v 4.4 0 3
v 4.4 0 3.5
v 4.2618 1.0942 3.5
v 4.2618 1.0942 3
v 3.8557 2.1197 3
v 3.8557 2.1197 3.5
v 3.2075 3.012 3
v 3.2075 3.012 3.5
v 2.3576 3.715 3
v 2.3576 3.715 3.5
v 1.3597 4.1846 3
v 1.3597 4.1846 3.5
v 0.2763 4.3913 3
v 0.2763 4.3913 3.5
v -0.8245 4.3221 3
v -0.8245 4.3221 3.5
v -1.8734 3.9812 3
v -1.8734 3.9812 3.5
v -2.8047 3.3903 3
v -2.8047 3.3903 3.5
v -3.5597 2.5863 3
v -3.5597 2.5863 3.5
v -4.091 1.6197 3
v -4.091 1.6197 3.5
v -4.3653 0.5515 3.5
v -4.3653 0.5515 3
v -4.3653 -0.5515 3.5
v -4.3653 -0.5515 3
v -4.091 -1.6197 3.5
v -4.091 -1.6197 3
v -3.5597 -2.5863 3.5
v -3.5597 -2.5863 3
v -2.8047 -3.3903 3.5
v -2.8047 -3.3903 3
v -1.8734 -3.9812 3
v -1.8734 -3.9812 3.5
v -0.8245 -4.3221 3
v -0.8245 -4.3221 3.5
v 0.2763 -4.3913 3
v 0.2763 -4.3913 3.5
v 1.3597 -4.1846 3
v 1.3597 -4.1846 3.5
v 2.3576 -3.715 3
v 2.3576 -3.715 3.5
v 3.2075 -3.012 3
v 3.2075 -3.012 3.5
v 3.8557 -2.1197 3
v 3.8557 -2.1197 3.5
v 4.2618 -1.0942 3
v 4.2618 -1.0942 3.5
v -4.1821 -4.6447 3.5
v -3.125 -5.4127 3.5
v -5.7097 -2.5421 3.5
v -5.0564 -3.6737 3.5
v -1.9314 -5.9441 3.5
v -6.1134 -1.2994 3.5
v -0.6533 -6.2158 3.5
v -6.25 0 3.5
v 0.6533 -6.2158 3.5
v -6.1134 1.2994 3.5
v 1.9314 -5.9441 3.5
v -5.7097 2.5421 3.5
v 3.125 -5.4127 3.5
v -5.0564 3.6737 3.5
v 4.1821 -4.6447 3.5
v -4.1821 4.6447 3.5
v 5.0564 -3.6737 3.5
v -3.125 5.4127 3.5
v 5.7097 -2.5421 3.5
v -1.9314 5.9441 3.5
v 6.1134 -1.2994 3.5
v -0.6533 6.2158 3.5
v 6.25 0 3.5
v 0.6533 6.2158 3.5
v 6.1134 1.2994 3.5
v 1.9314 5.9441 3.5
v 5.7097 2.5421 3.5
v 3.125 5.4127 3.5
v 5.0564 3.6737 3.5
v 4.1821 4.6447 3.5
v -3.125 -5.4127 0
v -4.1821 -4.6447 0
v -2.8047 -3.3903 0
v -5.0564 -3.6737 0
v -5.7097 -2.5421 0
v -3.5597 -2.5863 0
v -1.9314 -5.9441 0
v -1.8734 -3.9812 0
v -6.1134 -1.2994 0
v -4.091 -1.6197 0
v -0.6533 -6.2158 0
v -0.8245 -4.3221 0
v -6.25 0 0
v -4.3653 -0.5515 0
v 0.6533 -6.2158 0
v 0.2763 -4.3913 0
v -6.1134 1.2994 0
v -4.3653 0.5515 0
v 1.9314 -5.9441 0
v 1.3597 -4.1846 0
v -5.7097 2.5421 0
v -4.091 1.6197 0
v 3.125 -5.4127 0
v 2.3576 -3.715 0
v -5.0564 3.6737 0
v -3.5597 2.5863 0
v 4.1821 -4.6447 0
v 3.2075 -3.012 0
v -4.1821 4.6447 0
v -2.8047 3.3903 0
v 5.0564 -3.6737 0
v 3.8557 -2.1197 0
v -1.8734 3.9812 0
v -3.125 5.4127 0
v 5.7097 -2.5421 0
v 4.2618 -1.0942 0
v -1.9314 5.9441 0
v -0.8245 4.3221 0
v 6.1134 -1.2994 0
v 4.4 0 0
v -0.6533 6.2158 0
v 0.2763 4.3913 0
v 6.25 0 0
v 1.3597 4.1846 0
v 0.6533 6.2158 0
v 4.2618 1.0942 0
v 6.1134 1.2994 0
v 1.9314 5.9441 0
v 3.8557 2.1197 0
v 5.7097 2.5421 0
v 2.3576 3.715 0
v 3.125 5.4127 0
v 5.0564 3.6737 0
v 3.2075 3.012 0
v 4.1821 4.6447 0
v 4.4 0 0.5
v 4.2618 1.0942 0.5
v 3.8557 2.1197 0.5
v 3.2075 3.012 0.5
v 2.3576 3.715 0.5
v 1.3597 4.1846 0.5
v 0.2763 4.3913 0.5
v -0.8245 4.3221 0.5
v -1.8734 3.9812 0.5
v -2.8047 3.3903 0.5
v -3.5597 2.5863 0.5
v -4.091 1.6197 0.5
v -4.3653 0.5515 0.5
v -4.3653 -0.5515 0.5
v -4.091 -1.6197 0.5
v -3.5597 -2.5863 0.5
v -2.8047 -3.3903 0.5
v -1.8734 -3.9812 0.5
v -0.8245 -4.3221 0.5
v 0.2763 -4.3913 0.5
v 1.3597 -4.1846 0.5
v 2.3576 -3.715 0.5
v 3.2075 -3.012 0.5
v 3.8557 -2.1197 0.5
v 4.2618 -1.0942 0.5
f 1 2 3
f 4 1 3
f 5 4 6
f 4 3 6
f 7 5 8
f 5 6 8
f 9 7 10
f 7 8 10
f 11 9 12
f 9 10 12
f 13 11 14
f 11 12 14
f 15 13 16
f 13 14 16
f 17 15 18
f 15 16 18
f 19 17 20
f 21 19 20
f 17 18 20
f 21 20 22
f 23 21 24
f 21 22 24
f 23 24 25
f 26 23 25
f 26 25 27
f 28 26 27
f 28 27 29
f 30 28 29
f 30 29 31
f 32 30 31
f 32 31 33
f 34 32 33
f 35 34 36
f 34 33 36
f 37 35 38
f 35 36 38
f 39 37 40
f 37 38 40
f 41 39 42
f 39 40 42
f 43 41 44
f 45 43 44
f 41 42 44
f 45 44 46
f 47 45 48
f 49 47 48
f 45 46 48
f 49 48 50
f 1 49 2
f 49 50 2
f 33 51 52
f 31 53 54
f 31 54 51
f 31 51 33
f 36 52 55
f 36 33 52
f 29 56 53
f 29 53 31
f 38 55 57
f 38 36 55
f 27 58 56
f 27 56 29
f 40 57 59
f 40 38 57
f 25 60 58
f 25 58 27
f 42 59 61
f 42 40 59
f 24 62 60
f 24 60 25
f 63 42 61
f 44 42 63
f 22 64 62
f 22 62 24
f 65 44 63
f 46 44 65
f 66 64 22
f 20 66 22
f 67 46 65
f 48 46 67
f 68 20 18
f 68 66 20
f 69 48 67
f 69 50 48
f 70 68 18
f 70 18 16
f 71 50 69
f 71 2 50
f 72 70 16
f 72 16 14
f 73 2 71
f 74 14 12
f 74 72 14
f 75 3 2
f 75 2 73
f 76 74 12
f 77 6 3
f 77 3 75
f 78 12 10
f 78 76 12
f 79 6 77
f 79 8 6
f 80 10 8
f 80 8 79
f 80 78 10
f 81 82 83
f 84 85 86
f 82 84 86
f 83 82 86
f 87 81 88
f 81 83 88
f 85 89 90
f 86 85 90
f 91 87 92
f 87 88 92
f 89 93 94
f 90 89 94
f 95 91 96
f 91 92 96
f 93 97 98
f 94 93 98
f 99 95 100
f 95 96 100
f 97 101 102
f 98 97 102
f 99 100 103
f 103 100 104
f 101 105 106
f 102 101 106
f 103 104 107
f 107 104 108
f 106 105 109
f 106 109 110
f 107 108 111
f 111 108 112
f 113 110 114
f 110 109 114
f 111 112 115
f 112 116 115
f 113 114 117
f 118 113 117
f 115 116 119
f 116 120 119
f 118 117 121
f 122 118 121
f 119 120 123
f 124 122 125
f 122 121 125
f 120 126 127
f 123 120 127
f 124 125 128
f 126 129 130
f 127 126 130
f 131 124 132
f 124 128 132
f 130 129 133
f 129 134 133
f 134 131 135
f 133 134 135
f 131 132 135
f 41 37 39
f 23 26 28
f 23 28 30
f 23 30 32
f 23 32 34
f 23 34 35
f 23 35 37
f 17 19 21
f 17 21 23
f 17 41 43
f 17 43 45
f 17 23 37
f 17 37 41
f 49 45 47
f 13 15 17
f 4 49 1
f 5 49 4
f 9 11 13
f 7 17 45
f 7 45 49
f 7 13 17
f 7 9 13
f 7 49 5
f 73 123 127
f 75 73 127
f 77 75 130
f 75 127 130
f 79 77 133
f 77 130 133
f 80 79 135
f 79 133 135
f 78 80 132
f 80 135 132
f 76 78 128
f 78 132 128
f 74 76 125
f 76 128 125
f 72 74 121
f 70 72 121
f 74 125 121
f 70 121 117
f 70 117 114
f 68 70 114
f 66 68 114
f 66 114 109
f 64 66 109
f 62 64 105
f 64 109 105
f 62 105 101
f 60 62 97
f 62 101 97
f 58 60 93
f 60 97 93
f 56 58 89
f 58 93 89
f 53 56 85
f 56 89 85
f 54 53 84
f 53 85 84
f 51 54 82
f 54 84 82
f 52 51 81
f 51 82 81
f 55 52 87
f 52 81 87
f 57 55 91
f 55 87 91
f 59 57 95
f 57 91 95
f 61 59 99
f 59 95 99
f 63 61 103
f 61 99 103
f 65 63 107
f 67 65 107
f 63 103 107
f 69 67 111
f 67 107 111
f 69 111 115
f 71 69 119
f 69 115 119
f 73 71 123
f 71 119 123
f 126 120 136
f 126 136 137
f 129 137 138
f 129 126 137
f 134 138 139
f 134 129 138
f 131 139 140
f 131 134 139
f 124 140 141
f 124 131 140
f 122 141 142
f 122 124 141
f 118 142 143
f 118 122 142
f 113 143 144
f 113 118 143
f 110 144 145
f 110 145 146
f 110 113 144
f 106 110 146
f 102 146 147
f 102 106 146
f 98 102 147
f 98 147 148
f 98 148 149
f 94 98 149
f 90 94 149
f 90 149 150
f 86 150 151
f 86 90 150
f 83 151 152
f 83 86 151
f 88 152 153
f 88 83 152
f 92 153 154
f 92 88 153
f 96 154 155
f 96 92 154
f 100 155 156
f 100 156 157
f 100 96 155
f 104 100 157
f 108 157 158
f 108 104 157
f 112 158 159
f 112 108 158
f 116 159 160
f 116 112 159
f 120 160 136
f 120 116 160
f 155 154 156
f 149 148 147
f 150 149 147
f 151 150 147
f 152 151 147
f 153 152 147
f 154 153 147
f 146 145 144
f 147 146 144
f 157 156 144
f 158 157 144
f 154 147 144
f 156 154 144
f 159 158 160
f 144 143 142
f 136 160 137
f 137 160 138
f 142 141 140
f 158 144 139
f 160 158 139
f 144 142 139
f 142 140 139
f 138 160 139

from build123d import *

# Parameters (mm, degrees)
SKETCH1_R           = 6.25
BOSS_EXTRUDE1_DEPTH = 3.5
SKETCH2_R           = 4.4
CUT_EXTRUDE1_DEPTH  = 0.5


with BuildPart() as part:
    # Sketch1 → Boss-Extrude1 (new body)
    with BuildSketch(Plane.XY):
        Circle(SKETCH1_R)
    extrude(amount=BOSS_EXTRUDE1_DEPTH)

    # Sketch2 → Cut-Extrude1 (cut)
    with BuildSketch(Plane.XY.offset(3.5)):
        Circle(SKETCH2_R)
    cut_extrude1 = extrude(amount=-CUT_EXTRUDE1_DEPTH, mode=Mode.SUBTRACT)

    # Mirror1: Cut-Extrude1 across plane
    add(cut_extrude1.mirror(Plane.XY.offset(1.75)), mode=Mode.SUBTRACT)


solid = part.part
